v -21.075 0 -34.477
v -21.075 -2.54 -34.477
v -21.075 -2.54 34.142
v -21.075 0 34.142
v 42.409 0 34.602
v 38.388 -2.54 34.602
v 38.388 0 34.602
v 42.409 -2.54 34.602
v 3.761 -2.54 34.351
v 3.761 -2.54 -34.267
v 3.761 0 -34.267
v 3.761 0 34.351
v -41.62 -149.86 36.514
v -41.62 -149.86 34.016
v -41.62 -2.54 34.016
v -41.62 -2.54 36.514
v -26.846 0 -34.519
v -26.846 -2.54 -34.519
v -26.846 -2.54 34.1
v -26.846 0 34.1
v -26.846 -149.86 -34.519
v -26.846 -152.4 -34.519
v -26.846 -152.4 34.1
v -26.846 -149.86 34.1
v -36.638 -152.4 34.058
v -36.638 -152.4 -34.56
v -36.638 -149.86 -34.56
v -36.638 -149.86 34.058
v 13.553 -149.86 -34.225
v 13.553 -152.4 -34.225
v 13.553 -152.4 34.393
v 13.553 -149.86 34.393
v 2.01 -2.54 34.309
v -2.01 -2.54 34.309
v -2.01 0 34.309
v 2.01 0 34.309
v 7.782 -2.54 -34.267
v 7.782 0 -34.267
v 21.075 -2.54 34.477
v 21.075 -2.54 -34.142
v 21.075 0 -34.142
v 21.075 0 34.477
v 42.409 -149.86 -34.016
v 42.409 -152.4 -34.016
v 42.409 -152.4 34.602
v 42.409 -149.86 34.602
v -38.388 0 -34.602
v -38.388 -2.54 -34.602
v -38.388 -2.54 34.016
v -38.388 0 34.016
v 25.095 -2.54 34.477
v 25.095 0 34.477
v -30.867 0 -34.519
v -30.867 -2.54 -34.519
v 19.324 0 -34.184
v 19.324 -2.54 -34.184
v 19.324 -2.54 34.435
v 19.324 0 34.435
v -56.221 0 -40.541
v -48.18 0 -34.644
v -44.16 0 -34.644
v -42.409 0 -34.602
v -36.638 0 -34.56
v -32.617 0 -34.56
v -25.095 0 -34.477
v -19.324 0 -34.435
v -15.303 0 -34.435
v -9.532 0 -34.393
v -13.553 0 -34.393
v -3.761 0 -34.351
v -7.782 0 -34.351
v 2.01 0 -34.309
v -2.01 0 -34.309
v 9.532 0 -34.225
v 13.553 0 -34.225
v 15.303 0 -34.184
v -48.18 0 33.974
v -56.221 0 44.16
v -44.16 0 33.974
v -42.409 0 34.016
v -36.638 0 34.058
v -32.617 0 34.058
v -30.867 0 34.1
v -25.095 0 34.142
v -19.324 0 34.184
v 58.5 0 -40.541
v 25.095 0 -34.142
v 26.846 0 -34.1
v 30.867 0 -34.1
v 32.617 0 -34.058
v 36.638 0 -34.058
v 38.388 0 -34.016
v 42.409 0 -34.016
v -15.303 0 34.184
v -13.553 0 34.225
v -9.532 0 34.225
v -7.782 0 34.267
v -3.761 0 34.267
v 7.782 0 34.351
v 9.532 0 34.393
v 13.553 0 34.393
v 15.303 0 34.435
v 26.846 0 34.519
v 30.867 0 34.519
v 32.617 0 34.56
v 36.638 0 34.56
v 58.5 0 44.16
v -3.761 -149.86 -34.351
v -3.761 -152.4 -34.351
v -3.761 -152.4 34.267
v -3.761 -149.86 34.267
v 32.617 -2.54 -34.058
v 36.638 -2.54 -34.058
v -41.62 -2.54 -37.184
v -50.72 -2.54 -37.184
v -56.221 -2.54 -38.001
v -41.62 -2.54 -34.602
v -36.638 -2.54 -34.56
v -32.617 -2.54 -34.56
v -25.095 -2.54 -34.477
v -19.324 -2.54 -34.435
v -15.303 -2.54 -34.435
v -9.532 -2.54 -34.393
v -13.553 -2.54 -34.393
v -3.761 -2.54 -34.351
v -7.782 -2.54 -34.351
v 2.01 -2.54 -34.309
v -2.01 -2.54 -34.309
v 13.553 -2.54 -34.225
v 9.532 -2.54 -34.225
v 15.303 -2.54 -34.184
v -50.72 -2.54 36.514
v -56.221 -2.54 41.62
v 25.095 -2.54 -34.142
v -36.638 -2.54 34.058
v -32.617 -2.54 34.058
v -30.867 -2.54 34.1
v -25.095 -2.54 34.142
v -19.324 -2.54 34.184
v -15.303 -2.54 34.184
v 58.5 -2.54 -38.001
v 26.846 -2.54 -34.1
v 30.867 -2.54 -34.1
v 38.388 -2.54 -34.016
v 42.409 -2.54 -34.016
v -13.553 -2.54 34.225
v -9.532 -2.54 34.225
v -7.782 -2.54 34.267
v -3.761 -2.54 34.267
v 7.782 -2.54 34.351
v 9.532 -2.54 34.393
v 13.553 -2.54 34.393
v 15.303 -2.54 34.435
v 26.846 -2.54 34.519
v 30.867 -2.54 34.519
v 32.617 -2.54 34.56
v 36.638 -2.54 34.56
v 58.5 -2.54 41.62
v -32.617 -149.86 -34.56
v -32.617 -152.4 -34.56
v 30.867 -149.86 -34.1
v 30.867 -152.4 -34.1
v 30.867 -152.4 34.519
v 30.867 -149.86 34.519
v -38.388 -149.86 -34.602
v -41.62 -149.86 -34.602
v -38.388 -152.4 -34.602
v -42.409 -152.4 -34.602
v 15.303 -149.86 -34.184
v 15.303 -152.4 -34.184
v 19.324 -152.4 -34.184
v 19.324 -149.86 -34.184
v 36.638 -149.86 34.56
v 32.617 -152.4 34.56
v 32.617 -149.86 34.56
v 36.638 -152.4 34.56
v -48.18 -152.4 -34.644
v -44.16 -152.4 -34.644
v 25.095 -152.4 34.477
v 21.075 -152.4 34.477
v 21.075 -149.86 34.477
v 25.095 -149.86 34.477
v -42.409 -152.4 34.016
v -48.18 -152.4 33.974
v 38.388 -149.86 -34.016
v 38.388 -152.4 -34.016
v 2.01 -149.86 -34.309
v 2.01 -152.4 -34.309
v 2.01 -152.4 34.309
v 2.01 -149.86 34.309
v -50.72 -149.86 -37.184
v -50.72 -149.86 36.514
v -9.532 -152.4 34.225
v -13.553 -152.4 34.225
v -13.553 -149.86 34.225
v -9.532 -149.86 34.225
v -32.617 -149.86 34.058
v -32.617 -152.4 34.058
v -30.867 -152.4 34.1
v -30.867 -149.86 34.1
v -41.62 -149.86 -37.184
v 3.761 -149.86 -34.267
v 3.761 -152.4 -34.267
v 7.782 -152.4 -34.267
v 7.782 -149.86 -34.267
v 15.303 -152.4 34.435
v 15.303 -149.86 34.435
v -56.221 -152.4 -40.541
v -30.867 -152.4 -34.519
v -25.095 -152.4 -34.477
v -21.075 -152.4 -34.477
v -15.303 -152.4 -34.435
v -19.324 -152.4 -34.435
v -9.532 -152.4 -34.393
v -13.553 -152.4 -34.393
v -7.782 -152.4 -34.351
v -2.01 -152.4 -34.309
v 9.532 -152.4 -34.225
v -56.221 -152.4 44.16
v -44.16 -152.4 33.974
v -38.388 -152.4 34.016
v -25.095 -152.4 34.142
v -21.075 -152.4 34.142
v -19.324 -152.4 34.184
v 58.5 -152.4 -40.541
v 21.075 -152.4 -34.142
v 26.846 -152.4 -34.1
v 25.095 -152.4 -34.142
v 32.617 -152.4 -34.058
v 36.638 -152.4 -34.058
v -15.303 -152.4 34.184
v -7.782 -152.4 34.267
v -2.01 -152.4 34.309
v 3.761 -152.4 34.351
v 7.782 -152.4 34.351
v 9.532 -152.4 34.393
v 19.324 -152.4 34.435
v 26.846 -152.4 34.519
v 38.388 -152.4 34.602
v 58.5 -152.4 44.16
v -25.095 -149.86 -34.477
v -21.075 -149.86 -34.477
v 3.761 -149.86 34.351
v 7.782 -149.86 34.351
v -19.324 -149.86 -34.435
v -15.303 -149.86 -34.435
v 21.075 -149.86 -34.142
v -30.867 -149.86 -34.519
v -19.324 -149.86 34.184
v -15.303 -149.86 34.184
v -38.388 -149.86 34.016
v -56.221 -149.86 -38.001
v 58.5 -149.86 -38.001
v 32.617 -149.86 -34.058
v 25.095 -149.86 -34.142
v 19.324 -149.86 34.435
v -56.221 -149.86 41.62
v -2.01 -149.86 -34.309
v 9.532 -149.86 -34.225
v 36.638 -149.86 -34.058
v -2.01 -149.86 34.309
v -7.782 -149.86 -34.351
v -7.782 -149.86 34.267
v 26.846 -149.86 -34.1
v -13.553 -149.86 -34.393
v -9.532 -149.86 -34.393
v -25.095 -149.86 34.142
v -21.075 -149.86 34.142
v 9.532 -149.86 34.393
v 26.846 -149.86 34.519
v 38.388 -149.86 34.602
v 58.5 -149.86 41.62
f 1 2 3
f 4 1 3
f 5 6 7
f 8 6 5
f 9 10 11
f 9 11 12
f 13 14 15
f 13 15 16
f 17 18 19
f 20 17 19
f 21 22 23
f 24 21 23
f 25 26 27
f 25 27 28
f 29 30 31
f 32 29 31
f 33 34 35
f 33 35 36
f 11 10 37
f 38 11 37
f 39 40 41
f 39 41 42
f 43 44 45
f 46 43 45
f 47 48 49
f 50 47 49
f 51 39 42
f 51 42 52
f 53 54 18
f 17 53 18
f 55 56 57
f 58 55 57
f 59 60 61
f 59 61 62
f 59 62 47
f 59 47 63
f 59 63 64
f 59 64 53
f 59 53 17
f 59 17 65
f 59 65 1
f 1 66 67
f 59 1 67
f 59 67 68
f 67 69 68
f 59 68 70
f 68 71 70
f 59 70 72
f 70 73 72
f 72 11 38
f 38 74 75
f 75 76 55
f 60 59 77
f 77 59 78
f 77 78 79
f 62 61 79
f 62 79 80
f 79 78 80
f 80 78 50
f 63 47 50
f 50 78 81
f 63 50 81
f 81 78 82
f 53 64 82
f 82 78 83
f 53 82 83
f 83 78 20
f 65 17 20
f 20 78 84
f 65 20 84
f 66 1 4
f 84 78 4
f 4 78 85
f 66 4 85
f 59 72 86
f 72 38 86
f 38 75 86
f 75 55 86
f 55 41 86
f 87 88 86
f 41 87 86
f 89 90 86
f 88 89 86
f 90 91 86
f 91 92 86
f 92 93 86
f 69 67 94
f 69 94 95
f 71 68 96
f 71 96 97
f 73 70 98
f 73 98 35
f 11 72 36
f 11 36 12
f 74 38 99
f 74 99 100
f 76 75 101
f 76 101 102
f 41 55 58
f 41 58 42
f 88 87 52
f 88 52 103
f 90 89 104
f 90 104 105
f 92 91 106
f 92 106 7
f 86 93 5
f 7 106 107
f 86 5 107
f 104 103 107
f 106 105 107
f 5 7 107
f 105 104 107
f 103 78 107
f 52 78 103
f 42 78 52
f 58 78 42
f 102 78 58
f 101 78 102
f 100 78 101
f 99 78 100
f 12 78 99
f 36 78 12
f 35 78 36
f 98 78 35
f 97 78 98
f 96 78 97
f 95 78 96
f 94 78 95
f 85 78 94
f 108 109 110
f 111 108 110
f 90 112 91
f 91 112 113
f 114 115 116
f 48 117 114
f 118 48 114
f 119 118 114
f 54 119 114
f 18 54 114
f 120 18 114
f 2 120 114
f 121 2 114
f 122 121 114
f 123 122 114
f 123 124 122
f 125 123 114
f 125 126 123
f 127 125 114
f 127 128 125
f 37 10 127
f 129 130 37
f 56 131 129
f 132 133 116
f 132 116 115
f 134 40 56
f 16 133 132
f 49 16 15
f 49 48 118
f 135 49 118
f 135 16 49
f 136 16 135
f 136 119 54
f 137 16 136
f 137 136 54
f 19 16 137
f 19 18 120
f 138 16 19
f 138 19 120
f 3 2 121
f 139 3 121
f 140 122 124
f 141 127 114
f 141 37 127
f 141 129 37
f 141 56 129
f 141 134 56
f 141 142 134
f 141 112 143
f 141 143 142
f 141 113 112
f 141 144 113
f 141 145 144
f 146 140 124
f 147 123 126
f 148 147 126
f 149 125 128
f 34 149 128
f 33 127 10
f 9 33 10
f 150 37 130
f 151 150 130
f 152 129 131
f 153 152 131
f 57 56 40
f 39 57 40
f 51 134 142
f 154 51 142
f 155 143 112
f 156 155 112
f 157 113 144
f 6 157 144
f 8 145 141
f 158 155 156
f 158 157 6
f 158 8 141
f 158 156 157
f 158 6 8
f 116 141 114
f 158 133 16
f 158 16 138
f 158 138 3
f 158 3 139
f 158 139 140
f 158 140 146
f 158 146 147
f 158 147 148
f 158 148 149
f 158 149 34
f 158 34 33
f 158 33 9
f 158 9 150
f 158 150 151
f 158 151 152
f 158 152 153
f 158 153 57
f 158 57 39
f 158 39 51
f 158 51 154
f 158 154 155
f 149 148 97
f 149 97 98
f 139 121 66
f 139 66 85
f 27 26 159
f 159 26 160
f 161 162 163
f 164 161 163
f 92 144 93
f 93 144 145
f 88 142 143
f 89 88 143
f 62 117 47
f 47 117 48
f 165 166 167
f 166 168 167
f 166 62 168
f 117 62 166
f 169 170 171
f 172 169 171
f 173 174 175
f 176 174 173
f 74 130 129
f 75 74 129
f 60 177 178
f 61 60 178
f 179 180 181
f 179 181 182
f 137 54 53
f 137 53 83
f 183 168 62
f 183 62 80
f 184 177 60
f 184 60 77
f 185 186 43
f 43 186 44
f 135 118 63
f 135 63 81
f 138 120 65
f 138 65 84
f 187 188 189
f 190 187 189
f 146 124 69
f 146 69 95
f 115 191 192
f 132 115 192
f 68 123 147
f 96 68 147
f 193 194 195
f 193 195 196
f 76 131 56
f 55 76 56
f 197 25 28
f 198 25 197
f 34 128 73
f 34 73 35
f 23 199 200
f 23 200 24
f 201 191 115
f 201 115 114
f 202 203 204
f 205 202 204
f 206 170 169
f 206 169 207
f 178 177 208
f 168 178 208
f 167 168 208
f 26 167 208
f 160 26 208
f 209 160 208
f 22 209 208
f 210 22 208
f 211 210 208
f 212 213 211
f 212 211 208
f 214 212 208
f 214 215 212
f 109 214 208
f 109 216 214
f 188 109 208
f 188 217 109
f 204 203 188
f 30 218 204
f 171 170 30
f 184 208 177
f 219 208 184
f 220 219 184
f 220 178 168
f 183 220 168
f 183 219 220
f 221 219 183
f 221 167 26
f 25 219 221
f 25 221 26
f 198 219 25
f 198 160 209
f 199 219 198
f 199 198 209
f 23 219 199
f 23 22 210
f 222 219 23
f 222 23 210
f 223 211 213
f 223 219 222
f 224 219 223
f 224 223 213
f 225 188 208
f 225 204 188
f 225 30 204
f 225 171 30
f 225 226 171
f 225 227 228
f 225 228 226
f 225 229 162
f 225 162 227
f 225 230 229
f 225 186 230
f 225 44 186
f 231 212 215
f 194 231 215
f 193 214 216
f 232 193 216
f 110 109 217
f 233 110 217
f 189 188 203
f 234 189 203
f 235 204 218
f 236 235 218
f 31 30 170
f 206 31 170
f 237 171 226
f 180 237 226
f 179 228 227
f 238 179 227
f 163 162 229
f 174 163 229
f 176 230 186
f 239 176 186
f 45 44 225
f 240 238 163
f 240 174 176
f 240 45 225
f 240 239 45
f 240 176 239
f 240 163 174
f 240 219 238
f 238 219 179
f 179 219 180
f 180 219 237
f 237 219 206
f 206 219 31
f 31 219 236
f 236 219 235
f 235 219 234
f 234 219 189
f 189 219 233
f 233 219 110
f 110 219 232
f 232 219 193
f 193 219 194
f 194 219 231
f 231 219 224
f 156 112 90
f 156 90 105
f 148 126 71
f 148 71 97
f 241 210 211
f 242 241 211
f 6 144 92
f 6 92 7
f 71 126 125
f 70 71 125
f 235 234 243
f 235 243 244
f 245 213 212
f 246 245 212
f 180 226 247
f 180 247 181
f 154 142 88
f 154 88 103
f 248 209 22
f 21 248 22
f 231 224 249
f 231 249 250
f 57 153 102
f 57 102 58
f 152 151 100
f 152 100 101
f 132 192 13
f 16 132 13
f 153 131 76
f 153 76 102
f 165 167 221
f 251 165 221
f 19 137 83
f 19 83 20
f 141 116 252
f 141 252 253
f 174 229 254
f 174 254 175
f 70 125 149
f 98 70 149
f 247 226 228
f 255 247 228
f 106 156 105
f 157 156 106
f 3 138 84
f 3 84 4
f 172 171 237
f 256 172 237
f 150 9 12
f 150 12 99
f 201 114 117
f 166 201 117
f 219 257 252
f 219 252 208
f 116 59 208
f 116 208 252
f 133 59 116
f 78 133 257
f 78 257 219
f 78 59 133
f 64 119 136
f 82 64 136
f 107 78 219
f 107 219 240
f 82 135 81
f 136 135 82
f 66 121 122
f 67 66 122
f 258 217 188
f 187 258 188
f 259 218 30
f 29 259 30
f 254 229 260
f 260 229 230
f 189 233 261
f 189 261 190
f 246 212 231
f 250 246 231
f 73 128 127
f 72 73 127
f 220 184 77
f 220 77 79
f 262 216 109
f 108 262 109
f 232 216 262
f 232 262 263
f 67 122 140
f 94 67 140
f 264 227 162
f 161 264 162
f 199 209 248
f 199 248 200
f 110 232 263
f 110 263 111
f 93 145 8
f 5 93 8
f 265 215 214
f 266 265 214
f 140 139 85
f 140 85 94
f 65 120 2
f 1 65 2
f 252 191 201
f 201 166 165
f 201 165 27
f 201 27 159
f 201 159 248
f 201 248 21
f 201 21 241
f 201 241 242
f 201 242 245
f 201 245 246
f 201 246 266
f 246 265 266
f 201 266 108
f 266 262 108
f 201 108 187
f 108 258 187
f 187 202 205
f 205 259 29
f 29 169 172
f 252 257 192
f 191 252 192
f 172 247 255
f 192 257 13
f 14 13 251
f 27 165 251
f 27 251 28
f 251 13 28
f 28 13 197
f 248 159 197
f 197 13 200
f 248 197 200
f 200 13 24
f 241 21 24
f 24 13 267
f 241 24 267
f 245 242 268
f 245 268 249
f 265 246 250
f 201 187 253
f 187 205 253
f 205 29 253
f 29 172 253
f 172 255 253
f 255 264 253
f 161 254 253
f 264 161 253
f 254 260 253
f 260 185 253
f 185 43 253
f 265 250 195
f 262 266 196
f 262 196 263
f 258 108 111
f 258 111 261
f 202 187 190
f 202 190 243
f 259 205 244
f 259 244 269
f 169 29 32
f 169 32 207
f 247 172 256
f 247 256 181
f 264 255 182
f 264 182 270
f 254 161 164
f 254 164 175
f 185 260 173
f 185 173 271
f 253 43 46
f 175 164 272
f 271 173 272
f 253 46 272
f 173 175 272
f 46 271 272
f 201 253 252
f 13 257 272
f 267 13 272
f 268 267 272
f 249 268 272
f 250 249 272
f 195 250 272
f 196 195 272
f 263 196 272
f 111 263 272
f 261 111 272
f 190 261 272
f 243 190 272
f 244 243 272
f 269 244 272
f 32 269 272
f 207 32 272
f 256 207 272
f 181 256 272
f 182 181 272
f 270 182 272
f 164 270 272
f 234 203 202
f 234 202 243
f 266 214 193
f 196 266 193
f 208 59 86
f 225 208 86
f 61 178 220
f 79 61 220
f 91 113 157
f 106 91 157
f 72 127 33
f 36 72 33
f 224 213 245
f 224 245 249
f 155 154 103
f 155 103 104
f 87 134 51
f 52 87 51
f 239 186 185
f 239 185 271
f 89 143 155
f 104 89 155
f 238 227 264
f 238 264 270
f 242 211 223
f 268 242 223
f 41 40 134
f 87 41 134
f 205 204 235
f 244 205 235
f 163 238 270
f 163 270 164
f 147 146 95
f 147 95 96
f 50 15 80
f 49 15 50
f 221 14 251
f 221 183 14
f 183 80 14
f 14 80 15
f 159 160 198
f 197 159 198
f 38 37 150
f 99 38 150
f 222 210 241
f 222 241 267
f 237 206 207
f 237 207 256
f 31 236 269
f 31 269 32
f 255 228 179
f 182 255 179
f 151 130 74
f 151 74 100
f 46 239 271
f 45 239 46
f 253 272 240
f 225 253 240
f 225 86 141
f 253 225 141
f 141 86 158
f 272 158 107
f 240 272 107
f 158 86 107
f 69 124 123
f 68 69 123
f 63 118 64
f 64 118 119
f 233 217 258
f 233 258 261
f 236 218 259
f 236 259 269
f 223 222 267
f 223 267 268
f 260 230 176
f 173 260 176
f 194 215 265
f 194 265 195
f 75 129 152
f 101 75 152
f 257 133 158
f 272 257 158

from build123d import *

# Parameters (mm, degrees)
F0_W     = 114.7212088108
F0_H     = 84.7007036209
F1_DEPTH = 152.4
F2_W     = 4.020601511
F2_H     = 68.6182938516
F3_DEPTH = 152.4
F4_T     = -2.54
F5_DEPTH = 152.401
F6_DEPTH = 152.401
F7_DEPTH = 152.401
F8_DEPTH = 152.401


with BuildPart() as f1:
    # F0 (on Front) → F1 (new body)
    with BuildSketch(Plane.XZ):
        with Locations((1.1391714215, 1.8092729151)):
            Rectangle(F0_W, F0_H)
    extrude(amount=F1_DEPTH)

    # F2 (on face) → F3 (cut)
    with BuildSketch(Plane.XZ.offset(152.4)):
        with Locations((-46.1699254811, -0.3350507468)):
            Rectangle(F2_W, F2_H)
    extrude(amount=-F3_DEPTH, mode=Mode.SUBTRACT)

    # F4
    f4_openings = [f1.faces().sort_by_distance(p)[0] for p in [
        (-56.221433, -76.2, 1.809273),
        (58.499776, -76.2, 1.809273),
    ]]
    offset(amount=F4_T, openings=f4_openings, kind=Kind.INTERSECTION)

    # F2 (on face) → F5 (cut, through all)
    with BuildSketch(Plane.XZ.offset(152.4)):
        Rectangle(F2_W, F2_H)
    extrude(amount=-F5_DEPTH, mode=Mode.SUBTRACT)

    # F2 (on face) → F6 (cut, through all)
    with BuildSketch(Plane.XZ.offset(152.4)):
        with Locations((-23.0849627405, -0.1675253734)):
            Rectangle(F2_W, F2_H)
        with Locations((23.0849627405, 0.1675253734)):
            Rectangle(F2_W, F2_H)
    extrude(amount=-F6_DEPTH, mode=Mode.SUBTRACT)

    # F2 (on face) → F7 (cut, through all)
    with BuildSketch(Plane.XZ.offset(152.4)):
        with Locations((-34.6274441108, -0.2512880601)):
            Rectangle(F2_W, F2_H)
        with Locations((-11.5424813703, -0.0837626867)):
            Rectangle(F2_W, F2_H)
        with Locations((11.5424813703, 0.0837626867)):
            Rectangle(F2_W, F2_H)
        with Locations((34.6274441108, 0.2512880601)):
            Rectangle(F2_W, F2_H)
    extrude(amount=-F7_DEPTH, mode=Mode.SUBTRACT)

    # F2 (on face) → F8 (cut, through all)
    with BuildSketch(Plane.XZ.offset(152.4)):
        with Locations((-40.3986847959, -0.2931694034)):
            Rectangle(F2_W, F2_H)
        with Locations((-28.8562034257, -0.2094067167)):
            Rectangle(F2_W, F2_H)
        with Locations((-17.3137220554, -0.12564403)):
            Rectangle(F2_W, F2_H)
        with Locations((-5.7712406851, -0.0418813433)):
            Rectangle(F2_W, F2_H)
        with Locations((5.7712406851, 0.0418813433)):
            Rectangle(F2_W, F2_H)
        with Locations((17.3137220554, 0.12564403)):
            Rectangle(F2_W, F2_H)
        with Locations((28.8562034257, 0.2094067167)):
            Rectangle(F2_W, F2_H)
        with Locations((40.3986847959, 0.2931694034)):
            Rectangle(F2_W, F2_H)
    extrude(amount=-F8_DEPTH, mode=Mode.SUBTRACT)


solid = f1.part
